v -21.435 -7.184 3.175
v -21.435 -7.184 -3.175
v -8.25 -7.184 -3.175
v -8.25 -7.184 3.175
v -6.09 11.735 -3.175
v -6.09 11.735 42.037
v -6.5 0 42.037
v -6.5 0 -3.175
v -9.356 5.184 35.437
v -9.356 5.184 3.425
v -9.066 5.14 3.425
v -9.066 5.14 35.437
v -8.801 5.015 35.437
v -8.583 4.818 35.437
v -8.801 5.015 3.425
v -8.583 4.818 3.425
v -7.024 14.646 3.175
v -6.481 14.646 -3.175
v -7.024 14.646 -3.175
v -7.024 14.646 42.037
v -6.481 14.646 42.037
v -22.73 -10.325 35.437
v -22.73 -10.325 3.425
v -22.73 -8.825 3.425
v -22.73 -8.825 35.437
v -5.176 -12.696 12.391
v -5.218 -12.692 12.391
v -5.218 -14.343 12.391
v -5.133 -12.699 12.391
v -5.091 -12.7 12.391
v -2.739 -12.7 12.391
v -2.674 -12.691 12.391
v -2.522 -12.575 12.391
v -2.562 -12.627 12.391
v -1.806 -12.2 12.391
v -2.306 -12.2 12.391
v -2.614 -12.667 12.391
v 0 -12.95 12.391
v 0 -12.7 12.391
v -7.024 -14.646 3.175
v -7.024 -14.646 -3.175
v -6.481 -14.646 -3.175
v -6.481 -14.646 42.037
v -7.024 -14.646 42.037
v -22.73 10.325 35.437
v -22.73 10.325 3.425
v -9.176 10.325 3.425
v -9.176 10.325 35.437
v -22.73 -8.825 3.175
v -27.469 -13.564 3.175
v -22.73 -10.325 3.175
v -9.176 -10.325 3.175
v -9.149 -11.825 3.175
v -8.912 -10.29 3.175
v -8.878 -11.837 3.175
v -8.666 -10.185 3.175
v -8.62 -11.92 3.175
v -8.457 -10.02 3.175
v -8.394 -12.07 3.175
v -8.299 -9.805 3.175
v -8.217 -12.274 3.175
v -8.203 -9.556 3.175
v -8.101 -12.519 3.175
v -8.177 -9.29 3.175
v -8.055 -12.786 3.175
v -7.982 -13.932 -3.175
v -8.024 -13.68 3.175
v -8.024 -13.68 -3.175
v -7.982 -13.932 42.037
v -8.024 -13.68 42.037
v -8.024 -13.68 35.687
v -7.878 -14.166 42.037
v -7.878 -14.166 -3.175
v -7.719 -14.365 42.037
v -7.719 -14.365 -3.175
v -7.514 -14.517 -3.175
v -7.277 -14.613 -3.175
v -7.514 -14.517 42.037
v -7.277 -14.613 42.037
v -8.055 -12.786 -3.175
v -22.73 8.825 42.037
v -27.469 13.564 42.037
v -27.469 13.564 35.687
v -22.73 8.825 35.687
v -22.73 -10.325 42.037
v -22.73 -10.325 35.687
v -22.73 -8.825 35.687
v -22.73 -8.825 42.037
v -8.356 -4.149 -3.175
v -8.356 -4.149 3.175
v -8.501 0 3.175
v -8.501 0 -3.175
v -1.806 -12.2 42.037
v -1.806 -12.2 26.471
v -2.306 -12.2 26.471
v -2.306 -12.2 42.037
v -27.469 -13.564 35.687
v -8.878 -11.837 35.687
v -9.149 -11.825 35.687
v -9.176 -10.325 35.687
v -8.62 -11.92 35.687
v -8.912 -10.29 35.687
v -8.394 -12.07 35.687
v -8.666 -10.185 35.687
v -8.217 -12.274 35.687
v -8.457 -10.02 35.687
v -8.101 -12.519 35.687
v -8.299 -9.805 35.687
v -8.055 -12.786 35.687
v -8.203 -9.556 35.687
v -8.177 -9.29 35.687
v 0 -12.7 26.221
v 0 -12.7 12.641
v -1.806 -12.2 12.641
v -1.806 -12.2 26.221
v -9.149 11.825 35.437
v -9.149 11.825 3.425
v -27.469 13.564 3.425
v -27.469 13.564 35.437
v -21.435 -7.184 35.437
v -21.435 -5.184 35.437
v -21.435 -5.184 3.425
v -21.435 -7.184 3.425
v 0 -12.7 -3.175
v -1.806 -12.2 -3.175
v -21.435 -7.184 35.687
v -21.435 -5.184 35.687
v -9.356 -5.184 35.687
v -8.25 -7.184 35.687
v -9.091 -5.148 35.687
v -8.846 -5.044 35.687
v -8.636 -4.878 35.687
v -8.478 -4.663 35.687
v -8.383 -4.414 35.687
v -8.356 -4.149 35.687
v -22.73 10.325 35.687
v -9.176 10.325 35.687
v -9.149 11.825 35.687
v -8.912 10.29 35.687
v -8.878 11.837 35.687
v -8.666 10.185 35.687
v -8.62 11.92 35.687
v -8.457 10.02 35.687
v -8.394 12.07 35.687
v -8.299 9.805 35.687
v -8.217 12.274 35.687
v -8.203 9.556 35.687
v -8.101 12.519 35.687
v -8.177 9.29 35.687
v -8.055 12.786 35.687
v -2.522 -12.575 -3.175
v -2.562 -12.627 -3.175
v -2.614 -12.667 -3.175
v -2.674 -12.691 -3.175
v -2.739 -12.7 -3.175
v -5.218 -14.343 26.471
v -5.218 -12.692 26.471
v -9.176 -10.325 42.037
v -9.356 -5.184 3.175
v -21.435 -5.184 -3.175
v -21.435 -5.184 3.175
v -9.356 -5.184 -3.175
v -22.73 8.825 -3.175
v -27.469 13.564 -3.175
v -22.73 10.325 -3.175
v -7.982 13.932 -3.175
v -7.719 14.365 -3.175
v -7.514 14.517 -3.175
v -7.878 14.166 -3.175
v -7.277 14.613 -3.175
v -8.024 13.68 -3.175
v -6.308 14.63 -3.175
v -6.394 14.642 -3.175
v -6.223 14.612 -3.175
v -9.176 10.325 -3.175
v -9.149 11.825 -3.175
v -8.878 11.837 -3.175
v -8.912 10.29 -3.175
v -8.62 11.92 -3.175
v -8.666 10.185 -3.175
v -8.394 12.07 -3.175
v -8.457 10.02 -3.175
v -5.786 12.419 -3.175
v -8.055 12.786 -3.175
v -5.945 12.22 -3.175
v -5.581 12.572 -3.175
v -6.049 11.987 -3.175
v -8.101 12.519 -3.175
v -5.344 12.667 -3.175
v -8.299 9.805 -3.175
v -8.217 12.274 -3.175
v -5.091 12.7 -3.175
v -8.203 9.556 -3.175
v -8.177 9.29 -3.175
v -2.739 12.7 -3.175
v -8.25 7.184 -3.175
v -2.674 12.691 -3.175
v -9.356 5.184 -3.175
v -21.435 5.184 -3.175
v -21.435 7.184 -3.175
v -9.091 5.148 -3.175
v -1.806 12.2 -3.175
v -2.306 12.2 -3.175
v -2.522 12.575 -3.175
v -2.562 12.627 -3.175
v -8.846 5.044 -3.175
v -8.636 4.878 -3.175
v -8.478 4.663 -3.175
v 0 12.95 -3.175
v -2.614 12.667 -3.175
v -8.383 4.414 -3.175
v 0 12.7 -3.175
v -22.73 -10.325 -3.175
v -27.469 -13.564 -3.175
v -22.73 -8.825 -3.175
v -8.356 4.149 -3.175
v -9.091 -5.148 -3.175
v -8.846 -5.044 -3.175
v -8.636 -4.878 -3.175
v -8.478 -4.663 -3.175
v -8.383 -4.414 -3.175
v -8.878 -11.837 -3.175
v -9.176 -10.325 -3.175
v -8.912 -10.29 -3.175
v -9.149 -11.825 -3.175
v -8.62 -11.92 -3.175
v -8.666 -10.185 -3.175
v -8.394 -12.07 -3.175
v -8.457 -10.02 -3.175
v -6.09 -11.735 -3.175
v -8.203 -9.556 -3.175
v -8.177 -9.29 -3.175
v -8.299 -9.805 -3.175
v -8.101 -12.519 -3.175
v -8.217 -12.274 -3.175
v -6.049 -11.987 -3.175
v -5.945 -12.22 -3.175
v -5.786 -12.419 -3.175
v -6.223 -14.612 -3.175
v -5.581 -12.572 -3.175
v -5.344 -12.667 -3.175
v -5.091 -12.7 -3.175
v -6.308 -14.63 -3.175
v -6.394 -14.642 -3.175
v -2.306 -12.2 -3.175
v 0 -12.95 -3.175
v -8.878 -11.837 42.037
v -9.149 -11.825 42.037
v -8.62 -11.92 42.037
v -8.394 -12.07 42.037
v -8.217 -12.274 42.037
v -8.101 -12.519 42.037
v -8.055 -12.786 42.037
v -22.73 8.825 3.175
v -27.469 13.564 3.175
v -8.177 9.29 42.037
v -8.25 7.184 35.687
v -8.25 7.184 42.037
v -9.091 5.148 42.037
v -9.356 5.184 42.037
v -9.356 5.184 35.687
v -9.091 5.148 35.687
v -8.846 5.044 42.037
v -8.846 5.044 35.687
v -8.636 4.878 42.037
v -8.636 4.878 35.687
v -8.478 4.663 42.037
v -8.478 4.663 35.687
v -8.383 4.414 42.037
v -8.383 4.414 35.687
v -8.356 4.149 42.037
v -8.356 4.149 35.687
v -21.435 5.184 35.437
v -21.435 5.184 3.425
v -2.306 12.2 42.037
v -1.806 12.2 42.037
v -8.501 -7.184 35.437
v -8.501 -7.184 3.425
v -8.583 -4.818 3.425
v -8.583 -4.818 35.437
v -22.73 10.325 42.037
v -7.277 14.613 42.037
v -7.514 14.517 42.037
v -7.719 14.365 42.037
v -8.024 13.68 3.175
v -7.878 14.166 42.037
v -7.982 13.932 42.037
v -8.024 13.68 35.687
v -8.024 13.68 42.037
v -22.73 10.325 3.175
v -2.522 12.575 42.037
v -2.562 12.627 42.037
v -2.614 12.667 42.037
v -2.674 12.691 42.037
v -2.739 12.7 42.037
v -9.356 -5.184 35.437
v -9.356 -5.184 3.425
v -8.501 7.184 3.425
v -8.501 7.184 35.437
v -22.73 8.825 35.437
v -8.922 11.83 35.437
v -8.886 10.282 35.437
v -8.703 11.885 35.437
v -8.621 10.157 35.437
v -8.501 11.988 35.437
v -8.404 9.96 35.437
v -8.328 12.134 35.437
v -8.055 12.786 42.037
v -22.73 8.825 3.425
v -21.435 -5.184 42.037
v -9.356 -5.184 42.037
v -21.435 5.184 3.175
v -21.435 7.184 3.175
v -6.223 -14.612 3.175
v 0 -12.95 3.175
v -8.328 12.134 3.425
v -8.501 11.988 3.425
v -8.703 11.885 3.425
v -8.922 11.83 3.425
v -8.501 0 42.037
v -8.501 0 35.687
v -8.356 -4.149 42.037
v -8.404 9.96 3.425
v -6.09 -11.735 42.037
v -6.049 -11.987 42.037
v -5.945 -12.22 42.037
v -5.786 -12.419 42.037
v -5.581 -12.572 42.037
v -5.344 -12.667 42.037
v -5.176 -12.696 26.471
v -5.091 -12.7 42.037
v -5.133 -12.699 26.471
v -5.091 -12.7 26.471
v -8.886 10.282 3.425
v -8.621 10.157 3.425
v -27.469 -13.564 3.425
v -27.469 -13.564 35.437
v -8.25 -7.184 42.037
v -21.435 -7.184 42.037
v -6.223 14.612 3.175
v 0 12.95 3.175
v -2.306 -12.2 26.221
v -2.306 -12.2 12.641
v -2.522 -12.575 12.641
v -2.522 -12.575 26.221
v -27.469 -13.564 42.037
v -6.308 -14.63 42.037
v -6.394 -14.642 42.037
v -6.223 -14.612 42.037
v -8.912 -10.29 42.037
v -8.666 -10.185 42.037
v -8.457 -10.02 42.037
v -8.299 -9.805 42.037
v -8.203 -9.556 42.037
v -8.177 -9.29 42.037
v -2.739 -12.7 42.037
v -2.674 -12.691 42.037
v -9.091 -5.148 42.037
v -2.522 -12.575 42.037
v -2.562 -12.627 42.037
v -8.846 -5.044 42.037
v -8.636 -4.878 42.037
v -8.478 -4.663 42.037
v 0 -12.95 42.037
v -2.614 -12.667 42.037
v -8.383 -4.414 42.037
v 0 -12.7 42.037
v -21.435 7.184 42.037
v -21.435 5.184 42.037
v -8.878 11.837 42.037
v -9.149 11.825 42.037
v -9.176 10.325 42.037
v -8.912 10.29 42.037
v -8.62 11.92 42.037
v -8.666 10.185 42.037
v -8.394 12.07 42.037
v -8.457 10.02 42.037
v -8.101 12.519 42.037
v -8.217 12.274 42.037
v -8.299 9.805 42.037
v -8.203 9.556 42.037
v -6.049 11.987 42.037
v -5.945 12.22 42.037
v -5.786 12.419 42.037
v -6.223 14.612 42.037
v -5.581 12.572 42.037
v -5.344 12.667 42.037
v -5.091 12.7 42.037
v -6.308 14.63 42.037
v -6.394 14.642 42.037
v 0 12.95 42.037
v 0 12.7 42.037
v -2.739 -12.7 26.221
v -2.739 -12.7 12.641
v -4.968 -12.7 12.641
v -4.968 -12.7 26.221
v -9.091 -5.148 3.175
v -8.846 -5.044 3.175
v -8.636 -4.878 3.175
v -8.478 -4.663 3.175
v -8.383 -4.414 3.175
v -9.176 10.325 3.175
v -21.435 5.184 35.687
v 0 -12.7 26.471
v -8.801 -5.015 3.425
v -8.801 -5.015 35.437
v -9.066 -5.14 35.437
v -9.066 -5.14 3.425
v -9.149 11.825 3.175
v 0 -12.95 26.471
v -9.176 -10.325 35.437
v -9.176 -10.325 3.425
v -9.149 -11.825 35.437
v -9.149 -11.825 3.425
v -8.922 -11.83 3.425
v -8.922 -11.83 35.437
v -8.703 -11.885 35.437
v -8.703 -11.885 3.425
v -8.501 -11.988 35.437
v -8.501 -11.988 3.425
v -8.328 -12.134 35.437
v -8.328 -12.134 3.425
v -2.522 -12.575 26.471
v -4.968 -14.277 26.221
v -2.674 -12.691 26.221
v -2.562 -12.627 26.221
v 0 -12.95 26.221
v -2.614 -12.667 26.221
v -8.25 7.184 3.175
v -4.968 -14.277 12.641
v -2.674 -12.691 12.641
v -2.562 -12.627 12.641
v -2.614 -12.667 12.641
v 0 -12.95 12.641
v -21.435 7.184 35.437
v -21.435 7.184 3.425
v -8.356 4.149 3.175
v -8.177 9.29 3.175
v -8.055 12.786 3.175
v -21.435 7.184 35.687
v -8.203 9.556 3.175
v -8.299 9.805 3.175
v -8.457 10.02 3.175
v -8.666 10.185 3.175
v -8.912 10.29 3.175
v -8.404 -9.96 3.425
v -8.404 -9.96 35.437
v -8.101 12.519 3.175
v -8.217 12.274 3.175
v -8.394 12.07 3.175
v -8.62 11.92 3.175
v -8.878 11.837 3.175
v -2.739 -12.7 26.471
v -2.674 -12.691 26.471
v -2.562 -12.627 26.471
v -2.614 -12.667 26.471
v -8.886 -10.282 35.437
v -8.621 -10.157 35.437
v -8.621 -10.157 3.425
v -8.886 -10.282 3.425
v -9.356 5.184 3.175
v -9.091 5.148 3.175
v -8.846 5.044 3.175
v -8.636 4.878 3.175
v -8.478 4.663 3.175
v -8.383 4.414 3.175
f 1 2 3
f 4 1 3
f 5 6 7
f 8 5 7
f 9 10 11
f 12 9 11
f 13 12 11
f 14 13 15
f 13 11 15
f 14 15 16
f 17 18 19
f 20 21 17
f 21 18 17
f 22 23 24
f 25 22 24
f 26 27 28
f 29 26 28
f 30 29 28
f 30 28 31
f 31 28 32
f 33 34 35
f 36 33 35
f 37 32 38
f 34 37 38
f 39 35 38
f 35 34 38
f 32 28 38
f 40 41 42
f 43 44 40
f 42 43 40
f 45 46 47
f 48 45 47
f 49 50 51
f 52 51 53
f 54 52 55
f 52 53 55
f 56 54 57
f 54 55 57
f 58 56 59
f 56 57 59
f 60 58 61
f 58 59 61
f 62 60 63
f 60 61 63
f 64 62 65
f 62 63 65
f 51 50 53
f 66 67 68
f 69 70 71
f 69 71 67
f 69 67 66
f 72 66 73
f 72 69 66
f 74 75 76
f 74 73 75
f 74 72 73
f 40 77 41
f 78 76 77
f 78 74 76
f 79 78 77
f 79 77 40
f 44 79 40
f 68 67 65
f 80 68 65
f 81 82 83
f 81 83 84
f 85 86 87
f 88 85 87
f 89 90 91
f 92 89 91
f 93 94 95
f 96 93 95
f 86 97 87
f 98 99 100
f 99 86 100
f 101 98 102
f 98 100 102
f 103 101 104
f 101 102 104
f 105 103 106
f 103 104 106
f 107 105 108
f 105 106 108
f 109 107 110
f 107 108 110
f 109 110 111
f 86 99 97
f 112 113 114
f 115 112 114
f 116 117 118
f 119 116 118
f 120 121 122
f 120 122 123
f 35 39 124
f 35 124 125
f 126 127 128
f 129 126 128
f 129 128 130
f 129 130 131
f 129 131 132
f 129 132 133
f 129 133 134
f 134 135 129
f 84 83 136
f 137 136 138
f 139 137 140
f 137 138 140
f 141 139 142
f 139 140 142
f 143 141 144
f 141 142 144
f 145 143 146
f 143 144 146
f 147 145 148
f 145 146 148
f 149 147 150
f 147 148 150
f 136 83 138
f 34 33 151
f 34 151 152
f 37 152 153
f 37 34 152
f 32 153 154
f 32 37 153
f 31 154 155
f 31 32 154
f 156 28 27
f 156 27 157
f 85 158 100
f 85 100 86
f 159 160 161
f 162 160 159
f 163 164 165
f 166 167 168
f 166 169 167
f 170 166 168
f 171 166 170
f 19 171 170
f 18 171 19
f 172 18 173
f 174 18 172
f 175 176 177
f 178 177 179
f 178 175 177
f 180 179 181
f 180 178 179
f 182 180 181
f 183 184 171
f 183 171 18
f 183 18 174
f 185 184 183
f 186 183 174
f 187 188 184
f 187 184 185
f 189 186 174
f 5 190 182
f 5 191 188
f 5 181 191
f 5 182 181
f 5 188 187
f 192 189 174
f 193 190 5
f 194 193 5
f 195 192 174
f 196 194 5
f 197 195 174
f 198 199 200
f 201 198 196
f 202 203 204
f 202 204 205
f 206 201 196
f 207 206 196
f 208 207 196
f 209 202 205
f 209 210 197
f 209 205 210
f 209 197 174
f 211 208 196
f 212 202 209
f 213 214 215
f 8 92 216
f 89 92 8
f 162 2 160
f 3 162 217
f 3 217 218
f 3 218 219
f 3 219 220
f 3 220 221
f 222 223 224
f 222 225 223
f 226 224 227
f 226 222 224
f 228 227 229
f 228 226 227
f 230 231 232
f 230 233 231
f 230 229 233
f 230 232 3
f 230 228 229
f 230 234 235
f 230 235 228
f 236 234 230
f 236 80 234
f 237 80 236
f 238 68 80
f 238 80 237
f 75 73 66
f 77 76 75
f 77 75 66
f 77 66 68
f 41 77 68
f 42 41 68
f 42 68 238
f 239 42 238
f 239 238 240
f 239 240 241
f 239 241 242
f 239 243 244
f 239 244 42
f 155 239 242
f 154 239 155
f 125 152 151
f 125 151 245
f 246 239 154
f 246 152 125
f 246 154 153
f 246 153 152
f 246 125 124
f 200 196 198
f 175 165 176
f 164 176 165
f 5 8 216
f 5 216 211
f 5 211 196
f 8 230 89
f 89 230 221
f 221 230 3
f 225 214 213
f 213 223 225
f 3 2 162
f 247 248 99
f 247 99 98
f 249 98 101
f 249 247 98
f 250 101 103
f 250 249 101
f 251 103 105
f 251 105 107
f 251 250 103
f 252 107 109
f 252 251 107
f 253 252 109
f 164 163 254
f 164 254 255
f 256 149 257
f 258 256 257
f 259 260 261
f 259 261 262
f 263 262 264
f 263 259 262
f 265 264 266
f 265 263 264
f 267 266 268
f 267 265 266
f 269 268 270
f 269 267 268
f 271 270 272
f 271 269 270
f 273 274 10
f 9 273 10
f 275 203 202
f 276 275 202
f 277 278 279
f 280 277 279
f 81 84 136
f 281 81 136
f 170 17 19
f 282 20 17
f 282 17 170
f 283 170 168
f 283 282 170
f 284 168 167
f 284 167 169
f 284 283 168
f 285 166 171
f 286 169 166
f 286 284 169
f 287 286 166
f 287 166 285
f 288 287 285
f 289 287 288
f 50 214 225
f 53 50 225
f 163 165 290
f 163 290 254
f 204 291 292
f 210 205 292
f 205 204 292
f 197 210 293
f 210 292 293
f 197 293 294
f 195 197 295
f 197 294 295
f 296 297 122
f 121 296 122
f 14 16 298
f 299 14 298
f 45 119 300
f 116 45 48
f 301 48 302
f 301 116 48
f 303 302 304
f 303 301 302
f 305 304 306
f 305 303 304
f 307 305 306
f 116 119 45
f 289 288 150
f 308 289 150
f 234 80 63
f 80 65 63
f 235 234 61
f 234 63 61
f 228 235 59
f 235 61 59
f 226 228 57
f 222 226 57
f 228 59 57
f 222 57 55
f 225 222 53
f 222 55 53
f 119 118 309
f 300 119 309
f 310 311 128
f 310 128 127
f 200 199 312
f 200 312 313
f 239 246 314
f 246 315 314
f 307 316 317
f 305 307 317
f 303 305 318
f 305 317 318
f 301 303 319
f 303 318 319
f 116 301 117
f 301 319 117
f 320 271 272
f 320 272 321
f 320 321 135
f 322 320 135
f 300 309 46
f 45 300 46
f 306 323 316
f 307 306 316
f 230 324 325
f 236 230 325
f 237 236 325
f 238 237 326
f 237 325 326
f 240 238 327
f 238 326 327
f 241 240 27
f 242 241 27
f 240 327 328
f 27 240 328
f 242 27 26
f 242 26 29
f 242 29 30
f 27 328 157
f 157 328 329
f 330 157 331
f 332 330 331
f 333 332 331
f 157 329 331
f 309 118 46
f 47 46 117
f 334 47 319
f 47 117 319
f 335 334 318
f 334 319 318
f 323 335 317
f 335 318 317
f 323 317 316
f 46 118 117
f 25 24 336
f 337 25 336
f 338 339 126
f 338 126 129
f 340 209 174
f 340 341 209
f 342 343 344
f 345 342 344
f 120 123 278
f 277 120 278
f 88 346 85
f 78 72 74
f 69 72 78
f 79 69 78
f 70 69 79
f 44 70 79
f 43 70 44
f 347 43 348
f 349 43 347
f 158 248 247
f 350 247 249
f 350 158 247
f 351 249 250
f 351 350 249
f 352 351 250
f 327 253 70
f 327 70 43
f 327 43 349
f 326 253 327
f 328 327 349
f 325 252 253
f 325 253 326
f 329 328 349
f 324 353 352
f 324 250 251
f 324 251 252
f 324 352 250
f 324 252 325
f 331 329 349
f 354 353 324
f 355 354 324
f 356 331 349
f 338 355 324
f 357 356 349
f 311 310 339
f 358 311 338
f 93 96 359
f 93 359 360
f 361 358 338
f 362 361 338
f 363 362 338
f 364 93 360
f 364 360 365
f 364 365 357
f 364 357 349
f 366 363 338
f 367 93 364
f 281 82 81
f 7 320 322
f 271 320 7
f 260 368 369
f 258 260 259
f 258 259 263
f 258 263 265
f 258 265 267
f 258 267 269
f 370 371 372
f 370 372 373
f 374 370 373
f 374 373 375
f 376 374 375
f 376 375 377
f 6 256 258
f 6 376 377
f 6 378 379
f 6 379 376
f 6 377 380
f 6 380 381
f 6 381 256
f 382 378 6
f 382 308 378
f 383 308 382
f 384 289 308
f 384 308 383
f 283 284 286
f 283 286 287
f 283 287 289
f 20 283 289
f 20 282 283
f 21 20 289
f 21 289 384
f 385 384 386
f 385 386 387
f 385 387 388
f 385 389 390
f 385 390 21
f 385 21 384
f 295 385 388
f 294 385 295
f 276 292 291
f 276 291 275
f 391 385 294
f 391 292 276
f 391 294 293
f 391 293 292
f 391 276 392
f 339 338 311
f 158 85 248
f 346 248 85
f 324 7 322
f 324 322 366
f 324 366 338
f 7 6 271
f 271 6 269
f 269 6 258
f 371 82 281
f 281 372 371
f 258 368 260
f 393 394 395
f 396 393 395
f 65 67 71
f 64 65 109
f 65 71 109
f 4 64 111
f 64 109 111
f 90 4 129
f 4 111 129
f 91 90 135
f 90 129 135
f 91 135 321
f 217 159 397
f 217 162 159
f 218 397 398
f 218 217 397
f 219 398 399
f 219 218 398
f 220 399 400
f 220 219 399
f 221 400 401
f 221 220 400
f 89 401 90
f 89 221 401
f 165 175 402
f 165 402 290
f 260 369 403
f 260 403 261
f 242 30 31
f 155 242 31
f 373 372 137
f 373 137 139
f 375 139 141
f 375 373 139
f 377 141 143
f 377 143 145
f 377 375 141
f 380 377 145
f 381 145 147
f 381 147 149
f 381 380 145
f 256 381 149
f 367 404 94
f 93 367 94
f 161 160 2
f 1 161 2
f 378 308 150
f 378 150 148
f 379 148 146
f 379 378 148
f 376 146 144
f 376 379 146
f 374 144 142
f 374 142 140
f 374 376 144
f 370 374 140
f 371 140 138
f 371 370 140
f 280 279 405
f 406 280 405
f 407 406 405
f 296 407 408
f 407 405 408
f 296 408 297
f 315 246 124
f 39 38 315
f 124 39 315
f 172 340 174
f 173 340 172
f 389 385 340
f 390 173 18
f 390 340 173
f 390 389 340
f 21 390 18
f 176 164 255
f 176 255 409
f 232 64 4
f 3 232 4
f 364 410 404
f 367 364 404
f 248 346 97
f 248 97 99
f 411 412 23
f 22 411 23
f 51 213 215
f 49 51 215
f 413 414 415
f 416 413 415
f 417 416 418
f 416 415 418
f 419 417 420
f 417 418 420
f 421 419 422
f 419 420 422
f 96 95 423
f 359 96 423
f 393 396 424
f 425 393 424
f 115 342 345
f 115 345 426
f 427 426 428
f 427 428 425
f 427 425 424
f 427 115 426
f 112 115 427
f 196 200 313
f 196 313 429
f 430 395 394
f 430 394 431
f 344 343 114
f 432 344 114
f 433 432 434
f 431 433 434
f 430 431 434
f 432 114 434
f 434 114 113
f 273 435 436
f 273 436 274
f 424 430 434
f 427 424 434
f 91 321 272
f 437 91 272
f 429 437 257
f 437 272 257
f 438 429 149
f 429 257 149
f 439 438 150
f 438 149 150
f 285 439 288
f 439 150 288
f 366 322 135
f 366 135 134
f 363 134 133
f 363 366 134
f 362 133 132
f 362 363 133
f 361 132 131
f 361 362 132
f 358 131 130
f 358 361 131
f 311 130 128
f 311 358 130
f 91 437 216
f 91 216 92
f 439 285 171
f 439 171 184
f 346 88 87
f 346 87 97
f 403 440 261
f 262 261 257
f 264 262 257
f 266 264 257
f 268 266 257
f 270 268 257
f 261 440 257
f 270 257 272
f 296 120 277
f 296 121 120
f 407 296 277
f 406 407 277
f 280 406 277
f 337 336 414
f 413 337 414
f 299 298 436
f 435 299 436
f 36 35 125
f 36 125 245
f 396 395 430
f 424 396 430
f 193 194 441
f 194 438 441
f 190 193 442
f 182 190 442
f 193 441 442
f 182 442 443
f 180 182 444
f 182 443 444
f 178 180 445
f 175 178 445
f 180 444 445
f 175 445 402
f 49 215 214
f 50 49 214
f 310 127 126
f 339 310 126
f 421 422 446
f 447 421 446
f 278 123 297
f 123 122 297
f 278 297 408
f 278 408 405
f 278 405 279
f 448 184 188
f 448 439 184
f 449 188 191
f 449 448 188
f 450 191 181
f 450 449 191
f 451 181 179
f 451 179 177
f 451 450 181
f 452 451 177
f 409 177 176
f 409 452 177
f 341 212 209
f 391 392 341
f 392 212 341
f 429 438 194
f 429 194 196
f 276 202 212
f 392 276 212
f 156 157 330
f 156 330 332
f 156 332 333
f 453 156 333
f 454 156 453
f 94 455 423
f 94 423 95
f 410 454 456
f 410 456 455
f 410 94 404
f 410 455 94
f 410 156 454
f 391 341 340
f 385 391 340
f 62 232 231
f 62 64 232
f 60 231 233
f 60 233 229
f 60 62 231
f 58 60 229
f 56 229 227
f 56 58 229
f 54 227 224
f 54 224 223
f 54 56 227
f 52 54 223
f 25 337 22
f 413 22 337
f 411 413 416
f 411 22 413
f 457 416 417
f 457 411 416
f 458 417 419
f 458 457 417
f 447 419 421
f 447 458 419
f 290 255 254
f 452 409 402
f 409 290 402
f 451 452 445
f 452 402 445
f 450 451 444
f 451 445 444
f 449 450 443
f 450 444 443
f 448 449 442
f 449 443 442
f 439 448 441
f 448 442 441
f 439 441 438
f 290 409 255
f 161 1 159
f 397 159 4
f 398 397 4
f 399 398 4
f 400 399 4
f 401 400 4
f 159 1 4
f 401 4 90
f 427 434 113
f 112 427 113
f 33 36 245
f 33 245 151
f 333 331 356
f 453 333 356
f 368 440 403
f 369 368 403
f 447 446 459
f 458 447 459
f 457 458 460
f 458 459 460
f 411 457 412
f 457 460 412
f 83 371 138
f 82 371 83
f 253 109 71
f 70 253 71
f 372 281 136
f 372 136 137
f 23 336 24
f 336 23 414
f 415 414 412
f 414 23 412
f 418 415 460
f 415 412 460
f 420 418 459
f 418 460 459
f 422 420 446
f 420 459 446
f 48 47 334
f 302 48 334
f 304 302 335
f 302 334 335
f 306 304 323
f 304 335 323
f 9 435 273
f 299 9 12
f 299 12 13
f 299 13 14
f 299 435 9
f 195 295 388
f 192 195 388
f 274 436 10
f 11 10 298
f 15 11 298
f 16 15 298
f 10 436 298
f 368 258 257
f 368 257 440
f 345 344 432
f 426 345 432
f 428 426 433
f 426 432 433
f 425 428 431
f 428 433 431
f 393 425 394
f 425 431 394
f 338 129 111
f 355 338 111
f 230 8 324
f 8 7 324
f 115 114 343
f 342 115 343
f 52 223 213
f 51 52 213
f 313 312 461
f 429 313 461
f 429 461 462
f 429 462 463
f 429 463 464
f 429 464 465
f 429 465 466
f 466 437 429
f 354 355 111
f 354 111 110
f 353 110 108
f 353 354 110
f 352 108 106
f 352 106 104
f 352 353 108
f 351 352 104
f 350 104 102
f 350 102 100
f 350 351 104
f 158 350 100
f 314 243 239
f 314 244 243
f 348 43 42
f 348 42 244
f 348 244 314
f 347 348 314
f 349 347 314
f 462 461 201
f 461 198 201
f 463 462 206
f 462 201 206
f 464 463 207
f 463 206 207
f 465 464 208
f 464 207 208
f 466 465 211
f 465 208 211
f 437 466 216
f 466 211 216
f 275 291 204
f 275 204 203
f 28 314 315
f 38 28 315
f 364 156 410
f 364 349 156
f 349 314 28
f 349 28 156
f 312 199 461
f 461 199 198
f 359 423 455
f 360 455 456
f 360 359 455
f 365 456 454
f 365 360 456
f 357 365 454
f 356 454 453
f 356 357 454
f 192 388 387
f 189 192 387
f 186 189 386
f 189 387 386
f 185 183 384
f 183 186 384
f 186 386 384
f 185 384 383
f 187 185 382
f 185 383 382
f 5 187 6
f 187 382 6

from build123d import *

# Parameters (mm, degrees)
BOSS_EXTRUDE1_DEPTH     = 3.175
BOSS_EXTRUDE2_START     = -3.175
BOSS_EXTRUDE2_DEPTH     = 6.35
BOSS_EXTRUDE3_START     = -3.175
SKETCH3_W               = 13.184505581
SKETCH3_H               = 2
BOSS_EXTRUDE3_DEPTH     = 6.35
FILLET1_R               = 1
CUT_EXTRUDE4_DEPTH      = 32.291096892
CUT_EXTRUDE4_DEPTH_BACK = 32.291096892
SKETCH9_W               = 14.645539482
SKETCH9_H               = 14.645539482
BOSS_EXTRUDE4_DEPTH     = 6.35
BOSS_EXTRUDE5_START     = 32.512
BOSS_EXTRUDE5_DEPTH     = 32.512
SKETCH12_W              = 7.595900531
SKETCH12_H              = 14.08
CUT_EXTRUDE5_DEPTH      = 6.35
BOSS_EXTRUDE6_DEPTH     = 32.011999992
BOSS_EXTRUDE6_2_DEPTH   = 32.011999992
BOSS_EXTRUDE6_3_DEPTH   = 32.011999992
BOSS_EXTRUDE6_4_DEPTH   = 32.011999992
BOSS_EXTRUDE7_DEPTH     = 13.579999992


with BuildPart() as part:
    # Sketch1 → Boss-Extrude1 (new, symmetric)
    with BuildSketch(Plane.XY):
        with BuildLine():
            Line((-6.500091432, 0), (-6.090299711, 11.734899497))
            ThreePointArc((-6.090299711, 11.734899497), (-5.785567255, 12.4193398), (-5.090908884, 12.7))
            Line((-5.090908884, 12.7), (-3.975128678, 12.7))
            Line((-3.975128678, 12.7), (-2.738612788, 12.7))
            ThreePointArc((-2.738612788, 12.7), (-2.613612788, 12.666506351), (-2.522106437, 12.575))
            Line((-2.522106437, 12.575), (-2.305600086, 12.2))
            Line((-2.305600086, 12.2), (-1.805600086, 12.2))
            Line((-1.805600086, 12.2), (0, 12.7))
            Line((0, 12.7), (0, 12.95))
            Line((0, 12.95), (-6.35, 14.645539482))
            Line((-6.35, 14.645539482), (-7.989877012, 14.645539482))
            Line((-7.989877012, 14.645539482), (-8.50131052, 0))
            Line((-8.50131052, 0), (-7.989877012, -14.645539482))
            Line((-7.989877012, -14.645539482), (-6.35, -14.645539482))
            Line((-6.35, -14.645539482), (0, -12.95))
            Line((0, -12.95), (0, -12.7))
            Line((0, -12.7), (-1.805600086, -12.2))
            Line((-1.805600086, -12.2), (-2.305600086, -12.2))
            Line((-2.305600086, -12.2), (-2.522106437, -12.575))
            ThreePointArc((-2.522106437, -12.575), (-2.613612788, -12.666506351), (-2.738612788, -12.7))
            Line((-2.738612788, -12.7), (-3.975128678, -12.7))
            Line((-3.975128678, -12.7), (-5.090908884, -12.7))
            ThreePointArc((-5.090908884, -12.7), (-5.785567255, -12.4193398), (-6.090299711, -11.734899497))
            Line((-6.090299711, -11.734899497), (-6.500091432, 0))
        make_face()
    extrude(amount=BOSS_EXTRUDE1_DEPTH, both=True)

    # Sketch2 → Boss-Extrude2 (add)
    with BuildSketch(Plane.XY.offset(BOSS_EXTRUDE2_START)):
        Polygon((-22.730362754, 10.3251), (-22.730362754, 8.8251), (-27.469260875, 13.563998121), (-8.091860997, 11.725100248), (-8.091860997, 10.3251), align=None)
    extrude(amount=BOSS_EXTRUDE2_DEPTH)

    # Sketch3 → Boss-Extrude3 (add)
    with BuildSketch(Plane.XY.offset(BOSS_EXTRUDE3_START)):
        with Locations((-14.842709964, 6.1835)):
            Rectangle(SKETCH3_W, SKETCH3_H)
    extrude(amount=BOSS_EXTRUDE3_DEPTH)

    # Fillet1
    fillet1_edges = [part.edges().sort_by_distance(p)[0] for p in [
        (-7.989877012, 14.645539482, 0),
        (-6.35, 14.645539482, 0),
        (-8.140750083, 10.3251, 0),
        (-8.091860997, 11.725100248, 0),
        (-8.320298712, 5.1835, 0),
    ]]
    fillet(fillet1_edges, radius=FILLET1_R)

    # Sketch9 → Cut-Extrude4 (cut, two sides: drawn at the far end of the back side and taken through both)
    with BuildSketch(Plane.XY.offset(-CUT_EXTRUDE4_DEPTH_BACK)):
        with Locations((-7.322769741, -7.322769741)):
            Rectangle(SKETCH9_W, SKETCH9_H)
    extrude(amount=CUT_EXTRUDE4_DEPTH + CUT_EXTRUDE4_DEPTH_BACK, mode=Mode.SUBTRACT)

    # Mirror2: part across plane


with BuildPart() as part_1:
    add(part.part)
    add(part.part.mirror(Plane.ZX))



with BuildPart() as body_2:
    # Sketch10 → Boss-Extrude4 (new body)
    with BuildSketch(Plane.XY.offset(42.037)):
        with BuildLine():
            Line((-8.356438198, 4.148600503), (-8.50131052, 0))
            Line((-8.50131052, 0), (-8.356438198, -4.148600503))
            ThreePointArc((-8.356438198, -4.148600503), (-8.636489225, -4.87815837), (-9.355829025, -5.1835))
            Line((-9.355829025, -5.1835), (-21.434962754, -5.1835))
            Line((-21.434962754, -5.1835), (-21.434962754, -7.1835))
            Line((-21.434962754, -7.1835), (-8.250457173, -7.1835))
            Line((-8.250457173, -7.1835), (-8.17688957, -9.290200503))
            ThreePointArc((-8.17688957, -9.290200503), (-8.456940597, -10.01975837), (-9.176280397, -10.3251))
            Line((-9.176280397, -10.3251), (-22.730362754, -10.3251))
            Line((-22.730362754, -10.3251), (-22.730362754, -8.8251))
            Line((-22.730362754, -8.8251), (-27.469260875, -13.563998121))
            Line((-27.469260875, -13.563998121), (-9.148678369, -11.825391269))
            ThreePointArc((-9.148678369, -11.825391269), (-8.394340289, -12.069532985), (-8.054812897, -12.78601904))
            Line((-8.054812897, -12.78601904), (-8.023579064, -13.680438979))
            ThreePointArc((-8.023579064, -13.680438979), (-7.718846608, -14.364879283), (-7.024188237, -14.645539482))
            Line((-7.024188237, -14.645539482), (-6.481208628, -14.645539482))
            ThreePointArc((-6.481208628, -14.645539482), (-6.351115048, -14.637041202), (-6.223232611, -14.611690803))
            Line((-6.223232611, -14.611690803), (0, -12.95))
            Line((0, -12.95), (0, -12.7))
            Line((0, -12.7), (-1.805600086, -12.2))
            Line((-1.805600086, -12.2), (-2.305600086, -12.2))
            Line((-2.305600086, -12.2), (-2.522106437, -12.575))
            ThreePointArc((-2.522106437, -12.575), (-2.613612788, -12.666506351), (-2.738612788, -12.7))
            Line((-2.738612788, -12.7), (-5.090908884, -12.7))
            ThreePointArc((-5.090908884, -12.7), (-5.785567255, -12.4193398), (-6.090299711, -11.734899497))
            Line((-6.090299711, -11.734899497), (-6.500091432, 0))
            Line((-6.500091432, 0), (-6.090299711, 11.734899497))
            ThreePointArc((-6.090299711, 11.734899497), (-5.785567255, 12.4193398), (-5.090908884, 12.7))
            Line((-5.090908884, 12.7), (-2.738612788, 12.7))
            ThreePointArc((-2.738612788, 12.7), (-2.613612788, 12.666506351), (-2.522106437, 12.575))
            Line((-2.522106437, 12.575), (-2.305600086, 12.2))
            Line((-2.305600086, 12.2), (-1.805600086, 12.2))
            Line((-1.805600086, 12.2), (0, 12.7))
            Line((0, 12.7), (0, 12.95))
            Line((0, 12.95), (-6.223232611, 14.611690803))
            ThreePointArc((-6.223232611, 14.611690803), (-6.351115048, 14.637041202), (-6.481208628, 14.645539482))
            Line((-6.481208628, 14.645539482), (-7.024188237, 14.645539482))
            ThreePointArc((-7.024188237, 14.645539482), (-7.718846608, 14.364879283), (-8.023579064, 13.680438979))
            Line((-8.023579064, 13.680438979), (-8.054812897, 12.78601904))
            ThreePointArc((-8.054812897, 12.78601904), (-8.394340289, 12.069532985), (-9.148678369, 11.825391269))
            Line((-9.148678369, 11.825391269), (-27.469260875, 13.563998121))
            Line((-27.469260875, 13.563998121), (-22.730362754, 8.8251))
            Line((-22.730362754, 8.8251), (-22.730362754, 10.3251))
            Line((-22.730362754, 10.3251), (-9.176280397, 10.3251))
            ThreePointArc((-9.176280397, 10.3251), (-8.456940597, 10.01975837), (-8.17688957, 9.290200503))
            Line((-8.17688957, 9.290200503), (-8.250457173, 7.1835))
            Line((-8.250457173, 7.1835), (-21.434962754, 7.1835))
            Line((-21.434962754, 7.1835), (-21.434962754, 5.1835))
            Line((-21.434962754, 5.1835), (-9.355829025, 5.1835))
            ThreePointArc((-9.355829025, 5.1835), (-8.636489225, 4.87815837), (-8.356438198, 4.148600503))
        make_face()
    extrude(amount=-BOSS_EXTRUDE4_DEPTH)


with BuildPart() as part_2:
    add(part_1.part)

    add(body_2.part)  # Boss-Extrude5 merges body 2
    # Sketch11 → Boss-Extrude5 (add)
    with BuildSketch(Plane.XY.offset(3.175).offset(BOSS_EXTRUDE5_START)):
        with BuildLine():
            Line((-6.090299711, 11.734899497), (-6.500091432, 0))
            Line((-6.500091432, 0), (-6.090299711, -11.734899497))
            ThreePointArc((-6.090299711, -11.734899497), (-5.785567255, -12.4193398), (-5.090908884, -12.7))
            Line((-5.090908884, -12.7), (-2.738612788, -12.7))
            ThreePointArc((-2.738612788, -12.7), (-2.613612788, -12.666506351), (-2.522106437, -12.575))
            Line((-2.522106437, -12.575), (-2.305600086, -12.2))
            Line((-2.305600086, -12.2), (-1.805600086, -12.2))
            Line((-1.805600086, -12.2), (0, -12.7))
            Line((0, -12.7), (0, -12.95))
            Line((0, -12.95), (-6.223232611, -14.611690803))
            ThreePointArc((-6.223232611, -14.611690803), (-6.351115048, -14.637041202), (-6.481208628, -14.645539482))
            Line((-6.481208628, -14.645539482), (-7.024188237, -14.645539482))
            ThreePointArc((-7.024188237, -14.645539482), (-7.718846608, -14.364879283), (-8.023579064, -13.680438979))
            Line((-8.023579064, -13.680438979), (-8.50131052, 0))
            Line((-8.50131052, 0), (-8.023579064, 13.680438979))
            ThreePointArc((-8.023579064, 13.680438979), (-7.718846608, 14.364879283), (-7.024188237, 14.645539482))
            Line((-7.024188237, 14.645539482), (-6.481208628, 14.645539482))
            ThreePointArc((-6.481208628, 14.645539482), (-6.351115048, 14.637041202), (-6.223232611, 14.611690803))
            Line((-6.223232611, 14.611690803), (0, 12.95))
            Line((0, 12.95), (0, 12.7))
            Line((0, 12.7), (-1.805600086, 12.2))
            Line((-1.805600086, 12.2), (-2.305600086, 12.2))
            Line((-2.305600086, 12.2), (-2.522106437, 12.575))
            ThreePointArc((-2.522106437, 12.575), (-2.613612788, 12.666506351), (-2.738612788, 12.7))
            Line((-2.738612788, 12.7), (-5.090908884, 12.7))
            ThreePointArc((-5.090908884, 12.7), (-5.785567255, 12.4193398), (-6.090299711, 11.734899497))
        make_face()
    extrude(amount=-BOSS_EXTRUDE5_DEPTH)

    # Sketch12 → Cut-Extrude5 (cut)
    with BuildSketch(Plane.XZ.offset(14.645539482)):
        with Locations((-1.420091432, 19.431)):
            Rectangle(SKETCH12_W, SKETCH12_H)
    extrude(amount=-CUT_EXTRUDE5_DEPTH, mode=Mode.SUBTRACT)


with BuildPart() as body_2_2:
    # Sketch13 → Boss-Extrude6 (new body)
    with BuildSketch(Plane.XY.offset(3.425000008)):
        with BuildLine():
            Line((-8.327744451, -12.133709017), (-8.403653429, -9.959960275))
            ThreePointArc((-8.403653429, -9.959960275), (-8.74899845, -10.229218431), (-9.176280397, -10.3251))
            Line((-9.176280397, -10.3251), (-22.730362754, -10.3251))
            Line((-22.730362754, -10.3251), (-22.730362754, -8.8251))
            Line((-22.730362754, -8.8251), (-27.469260875, -13.563998121))
            Line((-27.469260875, -13.563998121), (-9.148678369, -11.825391269))
            ThreePointArc((-9.148678369, -11.825391269), (-8.702612909, -11.884764757), (-8.327744451, -12.133709017))
        make_face()
    extrude(amount=BOSS_EXTRUDE6_DEPTH)


with BuildPart() as body_3:
    # Sketch13 → Boss-Extrude6 2 (new body)
    with BuildSketch(Plane.XY.offset(3.425000008)):
        with BuildLine():
            Line((-21.434962754, -7.1835), (-8.500609559, -7.1835))
            Line((-8.500609559, -7.1835), (-8.583202058, -4.818360275))
            ThreePointArc((-8.583202058, -4.818360275), (-8.928547078, -5.087618431), (-9.355829025, -5.1835))
            Line((-9.355829025, -5.1835), (-21.434962754, -5.1835))
            Line((-21.434962754, -5.1835), (-21.434962754, -7.1835))
        make_face()
    extrude(amount=BOSS_EXTRUDE6_2_DEPTH)


with BuildPart() as body_4:
    # Sketch13 → Boss-Extrude6 3 (new body)
    with BuildSketch(Plane.XY.offset(3.425000008)):
        with BuildLine():
            Line((-8.583202058, 4.818360275), (-8.500609559, 7.1835))
            Line((-8.500609559, 7.1835), (-21.434962754, 7.1835))
            Line((-21.434962754, 7.1835), (-21.434962754, 5.1835))
            Line((-21.434962754, 5.1835), (-9.355829025, 5.1835))
            ThreePointArc((-9.355829025, 5.1835), (-8.928547078, 5.087618431), (-8.583202058, 4.818360275))
        make_face()
    extrude(amount=BOSS_EXTRUDE6_3_DEPTH)


with BuildPart() as body_5:
    # Sketch13 → Boss-Extrude6 4 (new body)
    with BuildSketch(Plane.XY.offset(3.425000008)):
        with BuildLine():
            Line((-8.403653429, 9.959960275), (-8.327744451, 12.133709017))
            ThreePointArc((-8.327744451, 12.133709017), (-8.702612909, 11.884764757), (-9.148678369, 11.825391269))
            Line((-9.148678369, 11.825391269), (-27.469260875, 13.563998121))
            Line((-27.469260875, 13.563998121), (-22.730362754, 8.8251))
            Line((-22.730362754, 8.8251), (-22.730362754, 10.3251))
            Line((-22.730362754, 10.3251), (-9.176280397, 10.3251))
            ThreePointArc((-9.176280397, 10.3251), (-8.74899845, 10.229218431), (-8.403653429, 9.959960275))
        make_face()
    extrude(amount=BOSS_EXTRUDE6_4_DEPTH)


with BuildPart() as body_6:
    # Sketch14 → Boss-Extrude7 (new body)
    with BuildSketch(Plane.XY.offset(12.641000008)):
        with BuildLine():
            Line((-4.968041697, -12.7), (-4.968041697, -14.276537141))
            Line((-4.968041697, -14.276537141), (0, -12.95))
            Line((0, -12.95), (0, -12.7))
            Line((0, -12.7), (-1.805600086, -12.2))
            Line((-1.805600086, -12.2), (-2.305600086, -12.2))
            Line((-2.305600086, -12.2), (-2.522106437, -12.575))
            ThreePointArc((-2.522106437, -12.575), (-2.613612788, -12.666506351), (-2.738612788, -12.7))
            Line((-2.738612788, -12.7), (-4.968041697, -12.7))
        make_face()
    extrude(amount=BOSS_EXTRUDE7_DEPTH)


solid = Compound([part_2.part, body_2_2.part, body_3.part, body_4.part, body_5.part, body_6.part])
